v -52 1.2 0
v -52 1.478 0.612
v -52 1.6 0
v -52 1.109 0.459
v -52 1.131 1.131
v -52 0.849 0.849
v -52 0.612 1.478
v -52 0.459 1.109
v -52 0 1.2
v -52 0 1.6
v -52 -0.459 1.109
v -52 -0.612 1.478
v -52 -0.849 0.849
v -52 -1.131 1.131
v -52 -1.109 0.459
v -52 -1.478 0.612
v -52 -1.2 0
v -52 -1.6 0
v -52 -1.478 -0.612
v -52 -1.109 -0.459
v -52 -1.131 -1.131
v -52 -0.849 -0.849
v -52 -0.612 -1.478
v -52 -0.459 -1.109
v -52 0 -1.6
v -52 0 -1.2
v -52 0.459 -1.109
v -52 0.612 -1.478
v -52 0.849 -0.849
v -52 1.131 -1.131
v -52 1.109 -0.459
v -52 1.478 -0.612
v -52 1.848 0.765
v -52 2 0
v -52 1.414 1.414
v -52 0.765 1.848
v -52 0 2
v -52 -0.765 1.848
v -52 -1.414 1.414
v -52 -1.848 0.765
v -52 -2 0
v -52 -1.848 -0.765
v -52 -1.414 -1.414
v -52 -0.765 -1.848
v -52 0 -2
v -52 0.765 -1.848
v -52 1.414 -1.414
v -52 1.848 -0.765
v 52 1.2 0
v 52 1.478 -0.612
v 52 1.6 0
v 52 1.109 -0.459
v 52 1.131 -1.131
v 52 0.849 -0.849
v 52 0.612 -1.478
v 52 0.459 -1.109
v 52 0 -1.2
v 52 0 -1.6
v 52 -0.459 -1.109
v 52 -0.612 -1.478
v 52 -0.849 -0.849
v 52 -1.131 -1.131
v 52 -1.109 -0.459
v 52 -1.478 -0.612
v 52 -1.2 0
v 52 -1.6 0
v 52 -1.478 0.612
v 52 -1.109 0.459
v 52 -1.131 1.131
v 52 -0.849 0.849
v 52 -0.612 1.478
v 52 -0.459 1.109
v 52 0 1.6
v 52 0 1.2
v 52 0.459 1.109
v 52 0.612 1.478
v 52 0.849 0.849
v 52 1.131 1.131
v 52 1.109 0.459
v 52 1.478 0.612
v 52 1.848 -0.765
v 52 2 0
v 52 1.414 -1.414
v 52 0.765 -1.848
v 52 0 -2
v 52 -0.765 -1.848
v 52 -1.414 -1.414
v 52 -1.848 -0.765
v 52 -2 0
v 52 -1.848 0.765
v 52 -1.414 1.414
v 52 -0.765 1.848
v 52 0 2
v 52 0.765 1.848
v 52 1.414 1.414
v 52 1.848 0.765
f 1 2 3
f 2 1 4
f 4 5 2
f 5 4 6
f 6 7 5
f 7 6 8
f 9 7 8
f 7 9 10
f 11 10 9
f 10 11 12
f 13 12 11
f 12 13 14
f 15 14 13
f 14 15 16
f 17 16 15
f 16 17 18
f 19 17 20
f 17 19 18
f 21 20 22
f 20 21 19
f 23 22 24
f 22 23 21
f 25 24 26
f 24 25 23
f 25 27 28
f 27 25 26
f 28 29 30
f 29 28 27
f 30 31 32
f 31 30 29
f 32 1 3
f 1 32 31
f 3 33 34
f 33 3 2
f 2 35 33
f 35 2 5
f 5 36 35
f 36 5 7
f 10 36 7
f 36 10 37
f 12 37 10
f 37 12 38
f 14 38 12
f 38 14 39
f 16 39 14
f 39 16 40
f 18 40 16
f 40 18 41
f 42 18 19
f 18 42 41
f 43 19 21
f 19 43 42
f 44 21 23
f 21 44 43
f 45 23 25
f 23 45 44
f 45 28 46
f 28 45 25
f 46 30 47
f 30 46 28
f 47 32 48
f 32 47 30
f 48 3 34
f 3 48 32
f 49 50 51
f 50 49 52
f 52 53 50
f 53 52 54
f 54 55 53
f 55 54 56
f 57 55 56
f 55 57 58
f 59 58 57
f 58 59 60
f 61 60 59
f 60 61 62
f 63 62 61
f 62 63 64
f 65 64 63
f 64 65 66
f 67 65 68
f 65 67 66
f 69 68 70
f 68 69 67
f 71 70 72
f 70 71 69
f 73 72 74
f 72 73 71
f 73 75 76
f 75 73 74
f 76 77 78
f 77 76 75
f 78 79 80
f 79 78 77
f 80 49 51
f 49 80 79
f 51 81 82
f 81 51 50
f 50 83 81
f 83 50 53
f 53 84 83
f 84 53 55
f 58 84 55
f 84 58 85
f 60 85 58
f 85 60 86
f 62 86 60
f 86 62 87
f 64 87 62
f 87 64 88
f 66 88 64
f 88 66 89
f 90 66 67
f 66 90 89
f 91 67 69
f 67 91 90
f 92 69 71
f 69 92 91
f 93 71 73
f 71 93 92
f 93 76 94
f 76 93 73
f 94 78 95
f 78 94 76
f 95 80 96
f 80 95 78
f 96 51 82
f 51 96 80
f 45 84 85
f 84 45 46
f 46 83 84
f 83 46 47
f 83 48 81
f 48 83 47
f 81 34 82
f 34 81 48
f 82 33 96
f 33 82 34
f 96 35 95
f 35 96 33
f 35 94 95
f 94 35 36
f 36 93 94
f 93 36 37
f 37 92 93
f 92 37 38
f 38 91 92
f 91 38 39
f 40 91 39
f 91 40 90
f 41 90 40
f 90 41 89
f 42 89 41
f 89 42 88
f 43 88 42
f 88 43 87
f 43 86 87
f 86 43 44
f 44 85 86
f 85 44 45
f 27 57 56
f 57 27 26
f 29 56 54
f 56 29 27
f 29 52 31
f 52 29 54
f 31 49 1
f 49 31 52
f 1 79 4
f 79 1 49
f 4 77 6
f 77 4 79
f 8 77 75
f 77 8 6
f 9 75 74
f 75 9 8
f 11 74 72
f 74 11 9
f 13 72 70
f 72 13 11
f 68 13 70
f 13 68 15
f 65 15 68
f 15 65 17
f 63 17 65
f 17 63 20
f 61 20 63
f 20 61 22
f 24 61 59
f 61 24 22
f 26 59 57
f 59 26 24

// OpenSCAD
// file: ../p/4-4cyli.scad
use <../lib.scad>
function ldraw_lib__4_4cyli() = [
// 0 Cylinder 1.0
// 0 Name: 4-4cyli.dat
// 0 Author: James Jessiman
// 0 !LDRAW_ORG Primitive UPDATE 2005-01
// 0 !LICENSE Licensed under CC BY 2.0 and CC BY 4.0 : see CAreadme.txt
// 
// 0 BFC CERTIFY CCW
  [0,"BFC","CERTIFY"],
  [0,"BFC","CCW"],
// 
// 0 !HISTORY 1998-12-15 [PTadmin] Official Update 1998-10
// 0 !HISTORY 2002-03-23 [sbliss] Added BFC statement; merged headers from files in distributions LDraw 0.27 and Complete.
// 0 !HISTORY 2002-04-25 [PTadmin] Official Update 2002-02
// 0 !HISTORY 2004-12-14 [guyvivan] BFC CCW
// 0 !HISTORY 2005-12-28 [PTadmin] Official Update 2005-01
// 0 !HISTORY 2007-06-24 [PTadmin] Header formatted for Contributor Agreement
// 0 !HISTORY 2008-07-01 [PTadmin] Official Update 2008-01
// 
// 
// 4 16 1 1 0 0.9239 1 0.3827 0.9239 0 0.3827 1 0 0
  [4,16,1,1,0,0.9239,1,0.3827,0.9239,0,0.3827,1,0,0],
// 5 24 1 0 0 1 1 0 0.9239 0 0.3827 0.9239 0 -0.3827
  [5,24,1,0,0,1,1,0,0.9239,0,0.3827,0.9239,0,-0.3827],
// 4 16 0.9239 1 0.3827 0.7071 1 0.7071 0.7071 0 0.7071 0.9239 0 0.3827
  [4,16,0.9239,1,0.3827,0.7071,1,0.7071,0.7071,0,0.7071,0.9239,0,0.3827],
// 5 24 0.9239 0 0.3827 0.9239 1 0.3827 0.7071 0 0.7071 1 0 0
  [5,24,0.9239,0,0.3827,0.9239,1,0.3827,0.7071,0,0.7071,1,0,0],
// 4 16 0.7071 1 0.7071 0.3827 1 0.9239 0.3827 0 0.9239 0.7071 0 0.7071
  [4,16,0.7071,1,0.7071,0.3827,1,0.9239,0.3827,0,0.9239,0.7071,0,0.7071],
// 5 24 0.7071 0 0.7071 0.7071 1 0.7071 0.3827 0 0.9239 0.9239 0 0.3827
  [5,24,0.7071,0,0.7071,0.7071,1,0.7071,0.3827,0,0.9239,0.9239,0,0.3827],
// 4 16 0.3827 1 0.9239 0 1 1 0 0 1 0.3827 0 0.9239
  [4,16,0.3827,1,0.9239,0,1,1,0,0,1,0.3827,0,0.9239],
// 5 24 0.3827 0 0.9239 0.3827 1 0.9239 0 0 1 0.7071 0 0.7071
  [5,24,0.3827,0,0.9239,0.3827,1,0.9239,0,0,1,0.7071,0,0.7071],
// 4 16 0 1 1 -0.3827 1 0.9239 -0.3827 0 0.9239 0 0 1
  [4,16,0,1,1,-0.3827,1,0.9239,-0.3827,0,0.9239,0,0,1],
// 5 24 0 0 1 0 1 1 -0.3827 0 0.9239 0.3827 0 0.9239
  [5,24,0,0,1,0,1,1,-0.3827,0,0.9239,0.3827,0,0.9239],
// 4 16 -0.3827 1 0.9239 -0.7071 1 0.7071 -0.7071 0 0.7071 -0.3827 0 0.9239
  [4,16,-0.3827,1,0.9239,-0.7071,1,0.7071,-0.7071,0,0.7071,-0.3827,0,0.9239],
// 5 24 -0.3827 0 0.9239 -0.3827 1 0.9239 -0.7071 0 0.7071 0 0 1
  [5,24,-0.3827,0,0.9239,-0.3827,1,0.9239,-0.7071,0,0.7071,0,0,1],
// 4 16 -0.7071 1 0.7071 -0.9239 1 0.3827 -0.9239 0 0.3827 -0.7071 0 0.7071
  [4,16,-0.7071,1,0.7071,-0.9239,1,0.3827,-0.9239,0,0.3827,-0.7071,0,0.7071],
// 5 24 -0.7071 0 0.7071 -0.7071 1 0.7071 -0.9239 0 0.3827 -0.3827 0 0.9239
  [5,24,-0.7071,0,0.7071,-0.7071,1,0.7071,-0.9239,0,0.3827,-0.3827,0,0.9239],
// 4 16 -0.9239 1 0.3827 -1 1 0 -1 0 0 -0.9239 0 0.3827
  [4,16,-0.9239,1,0.3827,-1,1,0,-1,0,0,-0.9239,0,0.3827],
// 5 24 -0.9239 0 0.3827 -0.9239 1 0.3827 -1 0 0 -0.7071 0 0.7071
  [5,24,-0.9239,0,0.3827,-0.9239,1,0.3827,-1,0,0,-0.7071,0,0.7071],
// 4 16 -1 1 0 -0.9239 1 -0.3827 -0.9239 0 -0.3827 -1 0 0
  [4,16,-1,1,0,-0.9239,1,-0.3827,-0.9239,0,-0.3827,-1,0,0],
// 5 24 -1 0 0 -1 1 0 -0.9239 0 -0.3827 -0.9239 0 0.3827
  [5,24,-1,0,0,-1,1,0,-0.9239,0,-0.3827,-0.9239,0,0.3827],
// 4 16 -0.9239 1 -0.3827 -0.7071 1 -0.7071 -0.7071 0 -0.7071 -0.9239 0 -0.3827
  [4,16,-0.9239,1,-0.3827,-0.7071,1,-0.7071,-0.7071,0,-0.7071,-0.9239,0,-0.3827],
// 5 24 -0.9239 0 -0.3827 -0.9239 1 -0.3827 -0.7071 0 -0.7071 -1 0 0
  [5,24,-0.9239,0,-0.3827,-0.9239,1,-0.3827,-0.7071,0,-0.7071,-1,0,0],
// 4 16 -0.7071 1 -0.7071 -0.3827 1 -0.9239 -0.3827 0 -0.9239 -0.7071 0 -0.7071
  [4,16,-0.7071,1,-0.7071,-0.3827,1,-0.9239,-0.3827,0,-0.9239,-0.7071,0,-0.7071],
// 5 24 -0.7071 0 -0.7071 -0.7071 1 -0.7071 -0.3827 0 -0.9239 -0.9239 0 -0.3827
  [5,24,-0.7071,0,-0.7071,-0.7071,1,-0.7071,-0.3827,0,-0.9239,-0.9239,0,-0.3827],
// 4 16 -0.3827 1 -0.9239 0 1 -1 0 0 -1 -0.3827 0 -0.9239
  [4,16,-0.3827,1,-0.9239,0,1,-1,0,0,-1,-0.3827,0,-0.9239],
// 5 24 -0.3827 0 -0.9239 -0.3827 1 -0.9239 0 0 -1 -0.7071 0 -0.7071
  [5,24,-0.3827,0,-0.9239,-0.3827,1,-0.9239,0,0,-1,-0.7071,0,-0.7071],
// 4 16 0 1 -1 0.3827 1 -0.9239 0.3827 0 -0.9239 0 0 -1
  [4,16,0,1,-1,0.3827,1,-0.9239,0.3827,0,-0.9239,0,0,-1],
// 5 24 0 0 -1 0 1 -1 0.3827 0 -0.9239 -0.3827 0 -0.9239
  [5,24,0,0,-1,0,1,-1,0.3827,0,-0.9239,-0.3827,0,-0.9239],
// 4 16 0.3827 1 -0.9239 0.7071 1 -0.7071 0.7071 0 -0.7071 0.3827 0 -0.9239
  [4,16,0.3827,1,-0.9239,0.7071,1,-0.7071,0.7071,0,-0.7071,0.3827,0,-0.9239],
// 5 24 0.3827 0 -0.9239 0.3827 1 -0.9239 0.7071 0 -0.7071 0 0 -1
  [5,24,0.3827,0,-0.9239,0.3827,1,-0.9239,0.7071,0,-0.7071,0,0,-1],
// 4 16 0.7071 1 -0.7071 0.9239 1 -0.3827 0.9239 0 -0.3827 0.7071 0 -0.7071
  [4,16,0.7071,1,-0.7071,0.9239,1,-0.3827,0.9239,0,-0.3827,0.7071,0,-0.7071],
// 5 24 0.7071 0 -0.7071 0.7071 1 -0.7071 0.9239 0 -0.3827 0.3827 0 -0.9239
  [5,24,0.7071,0,-0.7071,0.7071,1,-0.7071,0.9239,0,-0.3827,0.3827,0,-0.9239],
// 4 16 0.9239 1 -0.3827 1 1 0 1 0 0 0.9239 0 -0.3827
  [4,16,0.9239,1,-0.3827,1,1,0,1,0,0,0.9239,0,-0.3827],
// 5 24 0.9239 0 -0.3827 0.9239 1 -0.3827 1 0 0 0.7071 0 -0.7071
  [5,24,0.9239,0,-0.3827,0.9239,1,-0.3827,1,0,0,0.7071,0,-0.7071],
// 0
];
module ldraw_lib__4_4cyli(step=0, col=false, unit=2/5, alt=false, line=0.2, solid=!$preview)
    makepoly(ldraw_lib__4_4cyli(), step=step, col=col, unit=unit, alt=alt, line=line, solid=solid);
ldraw_lib__4_4cyli(line=0.2);
// file: ../p/4-4ring4.scad
use <../lib.scad>
function ldraw_lib__4_4ring4() = [
// 0 Ring  4 x 1.0
// 0 Name: 4-4ring4.dat
// 0 Author: James Jessiman
// 0 !LDRAW_ORG Primitive UPDATE 2009-01
// 0 !LICENSE Licensed under CC BY 2.0 and CC BY 4.0 : see CAreadme.txt
// 
// 0 BFC CERTIFY CCW
  [0,"BFC","CERTIFY"],
  [0,"BFC","CCW"],
// 
// 0 !HISTORY 1998-12-15 [PTadmin] Official Update 1998-10
// 0 !HISTORY 2002-04-08 [BrickCaster] Modified for BFC compliance
// 0 !HISTORY 2002-04-25 [PTadmin] Official Update 2002-02
// 0 !HISTORY 2007-06-24 [PTadmin] Header formatted for Contributor Agreement
// 0 !HISTORY 2008-07-01 [PTadmin] Official Update 2008-01
// 0 !HISTORY 2008-08-26 [cwdee] Switch polygon winding and rename
// 0 !HISTORY 2009-05-02 [PTadmin] Official Update 2009-01
// 
// 
// 4 16 -1.9135 0 4.6195 -1.5308 0 3.6956 0 0 4 0 0 5
  [4,16,-1.9135,0,4.6195,-1.5308,0,3.6956,0,0,4,0,0,5],
// 4 16 -3.5355 0 3.5355 -2.8284 0 2.8284 -1.5308 0 3.6956 -1.9135 0 4.6195
  [4,16,-3.5355,0,3.5355,-2.8284,0,2.8284,-1.5308,0,3.6956,-1.9135,0,4.6195],
// 4 16 -4.6195 0 1.9135 -3.6956 0 1.5308 -2.8284 0 2.8284 -3.5355 0 3.5355
  [4,16,-4.6195,0,1.9135,-3.6956,0,1.5308,-2.8284,0,2.8284,-3.5355,0,3.5355],
// 4 16 -5 0 0 -4 0 0 -3.6956 0 1.5308 -4.6195 0 1.9135
  [4,16,-5,0,0,-4,0,0,-3.6956,0,1.5308,-4.6195,0,1.9135],
// 4 16 -4.6195 0 -1.9135 -3.6956 0 -1.5308 -4 0 0 -5 0 0
  [4,16,-4.6195,0,-1.9135,-3.6956,0,-1.5308,-4,0,0,-5,0,0],
// 4 16 -3.5355 0 -3.5355 -2.8284 0 -2.8284 -3.6956 0 -1.5308 -4.6195 0 -1.9135
  [4,16,-3.5355,0,-3.5355,-2.8284,0,-2.8284,-3.6956,0,-1.5308,-4.6195,0,-1.9135],
// 4 16 -1.9135 0 -4.6195 -1.5308 0 -3.6956 -2.8284 0 -2.8284 -3.5355 0 -3.5355
  [4,16,-1.9135,0,-4.6195,-1.5308,0,-3.6956,-2.8284,0,-2.8284,-3.5355,0,-3.5355],
// 4 16 0 0 -5 0 0 -4 -1.5308 0 -3.6956 -1.9135 0 -4.6195
  [4,16,0,0,-5,0,0,-4,-1.5308,0,-3.6956,-1.9135,0,-4.6195],
// 4 16 1.9135 0 -4.6195 1.5308 0 -3.6956 0 0 -4 0 0 -5
  [4,16,1.9135,0,-4.6195,1.5308,0,-3.6956,0,0,-4,0,0,-5],
// 4 16 3.5355 0 -3.5355 2.8284 0 -2.8284 1.5308 0 -3.6956 1.9135 0 -4.6195
  [4,16,3.5355,0,-3.5355,2.8284,0,-2.8284,1.5308,0,-3.6956,1.9135,0,-4.6195],
// 4 16 4.6195 0 -1.9135 3.6956 0 -1.5308 2.8284 0 -2.8284 3.5355 0 -3.5355
  [4,16,4.6195,0,-1.9135,3.6956,0,-1.5308,2.8284,0,-2.8284,3.5355,0,-3.5355],
// 4 16 5 0 0 4 0 0 3.6956 0 -1.5308 4.6195 0 -1.9135
  [4,16,5,0,0,4,0,0,3.6956,0,-1.5308,4.6195,0,-1.9135],
// 4 16 4.6195 0 1.9135 3.6956 0 1.5308 4 0 0 5 0 0
  [4,16,4.6195,0,1.9135,3.6956,0,1.5308,4,0,0,5,0,0],
// 4 16 3.5355 0 3.5355 2.8284 0 2.8284 3.6956 0 1.5308 4.6195 0 1.9135
  [4,16,3.5355,0,3.5355,2.8284,0,2.8284,3.6956,0,1.5308,4.6195,0,1.9135],
// 4 16 1.9135 0 4.6195 1.5308 0 3.6956 2.8284 0 2.8284 3.5355 0 3.5355
  [4,16,1.9135,0,4.6195,1.5308,0,3.6956,2.8284,0,2.8284,3.5355,0,3.5355],
// 4 16 0 0 5 0 0 4 1.5308 0 3.6956 1.9135 0 4.6195
  [4,16,0,0,5,0,0,4,1.5308,0,3.6956,1.9135,0,4.6195],
// 0
];
module ldraw_lib__4_4ring4(step=0, col=false, unit=2/5, alt=false, line=0.2, solid=!$preview)
    makepoly(ldraw_lib__4_4ring4(), step=step, col=col, unit=unit, alt=alt, line=line, solid=solid);
ldraw_lib__4_4ring4(line=0.2);
// file: ../p/4-4ring3.scad
use <../lib.scad>
function ldraw_lib__4_4ring3() = [
// 0 Ring  3 x 1.0
// 0 Name: 4-4ring3.dat
// 0 Author: James Jessiman
// 0 !LDRAW_ORG Primitive UPDATE 2009-01
// 0 !LICENSE Licensed under CC BY 2.0 and CC BY 4.0 : see CAreadme.txt
// 
// 0 BFC CERTIFY CCW
  [0,"BFC","CERTIFY"],
  [0,"BFC","CCW"],
// 
// 0 !HISTORY 1998-12-15 [PTadmin] Official Update 1998-10
// 0 !HISTORY 2002-04-05 [hafhead] Added BFC statement
// 0 !HISTORY 2002-04-25 [PTadmin] Official Update 2002-02
// 0 !HISTORY 2007-06-24 [PTadmin] Header formatted for Contributor Agreement
// 0 !HISTORY 2008-07-01 [PTadmin] Official Update 2008-01
// 0 !HISTORY 2008-08-26 [cwdee] Switch polygon winding and rename
// 0 !HISTORY 2009-05-02 [PTadmin] Official Update 2009-01
// 
// 
// 4 16 -1.5308 0 3.6956 -1.1481 0 2.7717 0 0 3 0 0 4
  [4,16,-1.5308,0,3.6956,-1.1481,0,2.7717,0,0,3,0,0,4],
// 4 16 -2.8284 0 2.8284 -2.1213 0 2.1213 -1.1481 0 2.7717 -1.5308 0 3.6956
  [4,16,-2.8284,0,2.8284,-2.1213,0,2.1213,-1.1481,0,2.7717,-1.5308,0,3.6956],
// 4 16 -3.6956 0 1.5308 -2.7717 0 1.1481 -2.1213 0 2.1213 -2.8284 0 2.8284
  [4,16,-3.6956,0,1.5308,-2.7717,0,1.1481,-2.1213,0,2.1213,-2.8284,0,2.8284],
// 4 16 -4 0 0 -3 0 0 -2.7717 0 1.1481 -3.6956 0 1.5308
  [4,16,-4,0,0,-3,0,0,-2.7717,0,1.1481,-3.6956,0,1.5308],
// 4 16 -3.6956 0 -1.5308 -2.7717 0 -1.1481 -3 0 0 -4 0 0
  [4,16,-3.6956,0,-1.5308,-2.7717,0,-1.1481,-3,0,0,-4,0,0],
// 4 16 -2.8284 0 -2.8284 -2.1213 0 -2.1213 -2.7717 0 -1.1481 -3.6956 0 -1.5308
  [4,16,-2.8284,0,-2.8284,-2.1213,0,-2.1213,-2.7717,0,-1.1481,-3.6956,0,-1.5308],
// 4 16 -1.5308 0 -3.6956 -1.1481 0 -2.7717 -2.1213 0 -2.1213 -2.8284 0 -2.8284
  [4,16,-1.5308,0,-3.6956,-1.1481,0,-2.7717,-2.1213,0,-2.1213,-2.8284,0,-2.8284],
// 4 16 0 0 -4 0 0 -3 -1.1481 0 -2.7717 -1.5308 0 -3.6956
  [4,16,0,0,-4,0,0,-3,-1.1481,0,-2.7717,-1.5308,0,-3.6956],
// 4 16 1.5308 0 -3.6956 1.1481 0 -2.7717 0 0 -3 0 0 -4
  [4,16,1.5308,0,-3.6956,1.1481,0,-2.7717,0,0,-3,0,0,-4],
// 4 16 2.8284 0 -2.8284 2.1213 0 -2.1213 1.1481 0 -2.7717 1.5308 0 -3.6956
  [4,16,2.8284,0,-2.8284,2.1213,0,-2.1213,1.1481,0,-2.7717,1.5308,0,-3.6956],
// 4 16 3.6956 0 -1.5308 2.7717 0 -1.1481 2.1213 0 -2.1213 2.8284 0 -2.8284
  [4,16,3.6956,0,-1.5308,2.7717,0,-1.1481,2.1213,0,-2.1213,2.8284,0,-2.8284],
// 4 16 4 0 0 3 0 0 2.7717 0 -1.1481 3.6956 0 -1.5308
  [4,16,4,0,0,3,0,0,2.7717,0,-1.1481,3.6956,0,-1.5308],
// 4 16 3.6956 0 1.5308 2.7717 0 1.1481 3 0 0 4 0 0
  [4,16,3.6956,0,1.5308,2.7717,0,1.1481,3,0,0,4,0,0],
// 4 16 2.8284 0 2.8284 2.1213 0 2.1213 2.7717 0 1.1481 3.6956 0 1.5308
  [4,16,2.8284,0,2.8284,2.1213,0,2.1213,2.7717,0,1.1481,3.6956,0,1.5308],
// 4 16 1.5308 0 3.6956 1.1481 0 2.7717 2.1213 0 2.1213 2.8284 0 2.8284
  [4,16,1.5308,0,3.6956,1.1481,0,2.7717,2.1213,0,2.1213,2.8284,0,2.8284],
// 4 16 0 0 4 0 0 3 1.1481 0 2.7717 1.5308 0 3.6956
  [4,16,0,0,4,0,0,3,1.1481,0,2.7717,1.5308,0,3.6956],
// 0
];
module ldraw_lib__4_4ring3(step=0, col=false, unit=2/5, alt=false, line=0.2, solid=!$preview)
    makepoly(ldraw_lib__4_4ring3(), step=step, col=col, unit=unit, alt=alt, line=line, solid=solid);
ldraw_lib__4_4ring3(line=0.2);
// file: ../p/4-4edge.scad
use <../lib.scad>
function ldraw_lib__4_4edge() = [
// 0 Circle 1.0
// 0 Name: 4-4edge.dat
// 0 Author: James Jessiman
// 0 !LDRAW_ORG Primitive UPDATE 2017-01
// 0 !LICENSE Licensed under CC BY 4.0 : see CAreadme.txt
// 
// 0 BFC CERTIFY CCW
  [0,"BFC","CERTIFY"],
  [0,"BFC","CCW"],
// 
// 0 !HISTORY 1998-12-15 [PTadmin] Official Update 1998-10
// 0 !HISTORY 2005-12-28 [PTadmin] Official Update 2005-01
// 0 !HISTORY 2007-06-24 [PTadmin] Header formatted for Contributor Agreement
// 0 !HISTORY 2008-07-01 [PTadmin] Official Update 2008-01
// 0 !HISTORY 2017-01-15 [Steffen] BFCed
// 0 !HISTORY 2017-12-30 [PTadmin] Official Update 2017-01
// 
// 
// 2 24 1 0 0 0.9239 0 0.3827
  [2,24,1,0,0,0.9239,0,0.3827],
// 2 24 0.9239 0 0.3827 0.7071 0 0.7071
  [2,24,0.9239,0,0.3827,0.7071,0,0.7071],
// 2 24 0.7071 0 0.7071 0.3827 0 0.9239
  [2,24,0.7071,0,0.7071,0.3827,0,0.9239],
// 2 24 0.3827 0 0.9239 0 0 1
  [2,24,0.3827,0,0.9239,0,0,1],
// 2 24 0 0 1 -0.3827 0 0.9239
  [2,24,0,0,1,-0.3827,0,0.9239],
// 2 24 -0.3827 0 0.9239 -0.7071 0 0.7071
  [2,24,-0.3827,0,0.9239,-0.7071,0,0.7071],
// 2 24 -0.7071 0 0.7071 -0.9239 0 0.3827
  [2,24,-0.7071,0,0.7071,-0.9239,0,0.3827],
// 2 24 -0.9239 0 0.3827 -1 0 -0
  [2,24,-0.9239,0,0.3827,-1,0,-0],
// 2 24 -1 0 -0 -0.9239 0 -0.3827
  [2,24,-1,0,-0,-0.9239,0,-0.3827],
// 2 24 -0.9239 0 -0.3827 -0.7071 0 -0.7071
  [2,24,-0.9239,0,-0.3827,-0.7071,0,-0.7071],
// 2 24 -0.7071 0 -0.7071 -0.3827 0 -0.9239
  [2,24,-0.7071,0,-0.7071,-0.3827,0,-0.9239],
// 2 24 -0.3827 0 -0.9239 0 0 -1
  [2,24,-0.3827,0,-0.9239,0,0,-1],
// 2 24 0 0 -1 0.3827 0 -0.9239
  [2,24,0,0,-1,0.3827,0,-0.9239],
// 2 24 0.3827 0 -0.9239 0.7071 0 -0.7071
  [2,24,0.3827,0,-0.9239,0.7071,0,-0.7071],
// 2 24 0.7071 0 -0.7071 0.9239 0 -0.3827
  [2,24,0.7071,0,-0.7071,0.9239,0,-0.3827],
// 2 24 0.9239 0 -0.3827 1 0 0
  [2,24,0.9239,0,-0.3827,1,0,0],
];
module ldraw_lib__4_4edge(step=0, col=false, unit=2/5, alt=false, line=0.2, solid=!$preview)
    makepoly(ldraw_lib__4_4edge(), step=step, col=col, unit=unit, alt=alt, line=line, solid=solid);
ldraw_lib__4_4edge(line=0.2);
// file: 71533k03.scad
use <../lib.scad>
use <../p/4-4cyli.scad>
function ldraw_lib__71533k03() = [
// 0 ~Technic Pneumatic Tube Segment
// 0 Name: 71533k03.dat
// 0 Author: Jaco van der Molen [Jaco]
// 0 !LDRAW_ORG Part Flexible_Section UPDATE 2020-01
// 0 !LICENSE Licensed under CC BY 4.0 : see CAreadme.txt
// 
// 0 BFC CERTIFY CW
  [0,"BFC","CERTIFY"],
  [0,"BFC","CW"],
// 
// 0 !HISTORY 2003-11-30 [Steffen] BFCed
// 0 !HISTORY 2009-12-29 [PTadmin] Official Update 2009-03
// 0 !HISTORY 2020-06-27 [PTadmin] Renamed from 166
// 0 !HISTORY 2020-06-28 [PTadmin] Official Update 2020-01
// 
// 
// 1 16 0 0 0 5 0 0 0 1 0 0 0 5 4-4cyli.dat
  [1,16,0,0,0,5,0,0,0,1,0,0,0,5, ldraw_lib__4_4cyli()],
// 0 BFC INVERTNEXT
  [0,"BFC","INVERTNEXT"],
// 1 16 0 0 0 3 0 0 0 1 0 0 0 3 4-4cyli.dat
  [1,16,0,0,0,3,0,0,0,1,0,0,0,3, ldraw_lib__4_4cyli()],
// 0
];
module ldraw_lib__71533k03(step=0, col=false, unit=2/5, alt=false, line=0.2, solid=!$preview)
    makepoly(ldraw_lib__71533k03(), step=step, col=col, unit=unit, alt=alt, line=line, solid=solid);
ldraw_lib__71533k03(line=0.2);
// file: 71533k02.scad
use <../lib.scad>
use <../p/4-4edge.scad>
use <../p/4-4ring3.scad>
use <../p/4-4ring4.scad>
function ldraw_lib__71533k02() = [
// 0 ~Technic Pneumatic Tube End (Non-Bulged)
// 0 Name: 71533k02.dat
// 0 Author: Steffen [Steffen]
// 0 !LDRAW_ORG Part Flexible_Section UPDATE 2020-01
// 0 !LICENSE Licensed under CC BY 4.0 : see CAreadme.txt
// 
// 0 BFC CERTIFY CCW
  [0,"BFC","CERTIFY"],
  [0,"BFC","CCW"],
// 
// 0 !HISTORY 2020-06-28 [PTadmin] Official Update 2020-01
// 
// 
// 0 // This file goes together with 71533k01.dat and 71533k03.dat.
// 0 // Those 3 files can be used to create Technic Pneumatic Tubes
// 0 // with either bulged or non-bulged ends.
// 
// 1 16 0 0 0 1 0 0 0 1 0 0 0 1 4-4ring3.dat
  [1,16,0,0,0,1,0,0,0,1,0,0,0,1, ldraw_lib__4_4ring3()],
// 1 16 0 0 0 1 0 0 0 1 0 0 0 1 4-4ring4.dat
  [1,16,0,0,0,1,0,0,0,1,0,0,0,1, ldraw_lib__4_4ring4()],
// 1 16 0 0 0 3 0 0 0 3 0 0 0 3 4-4edge.dat
  [1,16,0,0,0,3,0,0,0,3,0,0,0,3, ldraw_lib__4_4edge()],
// 1 16 0 0 0 5 0 0 0 5 0 0 0 5 4-4edge.dat
  [1,16,0,0,0,5,0,0,0,5,0,0,0,5, ldraw_lib__4_4edge()],
];
module ldraw_lib__71533k02(step=0, col=false, unit=2/5, alt=false, line=0.2, solid=!$preview)
    makepoly(ldraw_lib__71533k02(), step=step, col=col, unit=unit, alt=alt, line=line, solid=solid);
ldraw_lib__71533k02(line=0.2);
// main file
use <../lib.scad>
use <71533k02.scad>
use <71533k03.scad>
function ldraw_lib__37467_f1() = [
// 0 Technic Pneumatic Tube 13L
// 0 Name: 37467-f1.dat
// 0 Author: Philippe Hurbain [Philo]
// 0 !LDRAW_ORG Part UPDATE 2020-02
// 0 !LICENSE Licensed under CC BY 4.0 : see CAreadme.txt
// 
// 0 BFC CERTIFY CCW
  [0,"BFC","CERTIFY"],
  [0,"BFC","CCW"],
// 
// 0 !KEYWORDS 104 mm
// 
// 0 !HISTORY 2020-09-05 [PTadmin] Official Update 2020-02
// 
// 
// 1 16 -130 0 0 0 1 0 1 0 0 0 0 1 71533k02.dat
  [1,16,-130,0,0,0,1,0,1,0,0,0,0,1, ldraw_lib__71533k02()],
// 1 16 130 0 0 0 -1 0 -1 0 0 0 0 1 71533k02.dat
  [1,16,130,0,0,0,-1,0,-1,0,0,0,0,1, ldraw_lib__71533k02()],
// 1 16 -130 0 0 0 260 0 1 0 0 0 0 1 71533k03.dat
  [1,16,-130,0,0,0,260,0,1,0,0,0,0,1, ldraw_lib__71533k03()],
];
module ldraw_lib__37467_f1(step=0, col=false, unit=2/5, alt=false, line=0.2, solid=!$preview)
    makepoly(ldraw_lib__37467_f1(), step=step, col=col, unit=unit, alt=alt, line=line, solid=solid);
ldraw_lib__37467_f1(line=0.2);
